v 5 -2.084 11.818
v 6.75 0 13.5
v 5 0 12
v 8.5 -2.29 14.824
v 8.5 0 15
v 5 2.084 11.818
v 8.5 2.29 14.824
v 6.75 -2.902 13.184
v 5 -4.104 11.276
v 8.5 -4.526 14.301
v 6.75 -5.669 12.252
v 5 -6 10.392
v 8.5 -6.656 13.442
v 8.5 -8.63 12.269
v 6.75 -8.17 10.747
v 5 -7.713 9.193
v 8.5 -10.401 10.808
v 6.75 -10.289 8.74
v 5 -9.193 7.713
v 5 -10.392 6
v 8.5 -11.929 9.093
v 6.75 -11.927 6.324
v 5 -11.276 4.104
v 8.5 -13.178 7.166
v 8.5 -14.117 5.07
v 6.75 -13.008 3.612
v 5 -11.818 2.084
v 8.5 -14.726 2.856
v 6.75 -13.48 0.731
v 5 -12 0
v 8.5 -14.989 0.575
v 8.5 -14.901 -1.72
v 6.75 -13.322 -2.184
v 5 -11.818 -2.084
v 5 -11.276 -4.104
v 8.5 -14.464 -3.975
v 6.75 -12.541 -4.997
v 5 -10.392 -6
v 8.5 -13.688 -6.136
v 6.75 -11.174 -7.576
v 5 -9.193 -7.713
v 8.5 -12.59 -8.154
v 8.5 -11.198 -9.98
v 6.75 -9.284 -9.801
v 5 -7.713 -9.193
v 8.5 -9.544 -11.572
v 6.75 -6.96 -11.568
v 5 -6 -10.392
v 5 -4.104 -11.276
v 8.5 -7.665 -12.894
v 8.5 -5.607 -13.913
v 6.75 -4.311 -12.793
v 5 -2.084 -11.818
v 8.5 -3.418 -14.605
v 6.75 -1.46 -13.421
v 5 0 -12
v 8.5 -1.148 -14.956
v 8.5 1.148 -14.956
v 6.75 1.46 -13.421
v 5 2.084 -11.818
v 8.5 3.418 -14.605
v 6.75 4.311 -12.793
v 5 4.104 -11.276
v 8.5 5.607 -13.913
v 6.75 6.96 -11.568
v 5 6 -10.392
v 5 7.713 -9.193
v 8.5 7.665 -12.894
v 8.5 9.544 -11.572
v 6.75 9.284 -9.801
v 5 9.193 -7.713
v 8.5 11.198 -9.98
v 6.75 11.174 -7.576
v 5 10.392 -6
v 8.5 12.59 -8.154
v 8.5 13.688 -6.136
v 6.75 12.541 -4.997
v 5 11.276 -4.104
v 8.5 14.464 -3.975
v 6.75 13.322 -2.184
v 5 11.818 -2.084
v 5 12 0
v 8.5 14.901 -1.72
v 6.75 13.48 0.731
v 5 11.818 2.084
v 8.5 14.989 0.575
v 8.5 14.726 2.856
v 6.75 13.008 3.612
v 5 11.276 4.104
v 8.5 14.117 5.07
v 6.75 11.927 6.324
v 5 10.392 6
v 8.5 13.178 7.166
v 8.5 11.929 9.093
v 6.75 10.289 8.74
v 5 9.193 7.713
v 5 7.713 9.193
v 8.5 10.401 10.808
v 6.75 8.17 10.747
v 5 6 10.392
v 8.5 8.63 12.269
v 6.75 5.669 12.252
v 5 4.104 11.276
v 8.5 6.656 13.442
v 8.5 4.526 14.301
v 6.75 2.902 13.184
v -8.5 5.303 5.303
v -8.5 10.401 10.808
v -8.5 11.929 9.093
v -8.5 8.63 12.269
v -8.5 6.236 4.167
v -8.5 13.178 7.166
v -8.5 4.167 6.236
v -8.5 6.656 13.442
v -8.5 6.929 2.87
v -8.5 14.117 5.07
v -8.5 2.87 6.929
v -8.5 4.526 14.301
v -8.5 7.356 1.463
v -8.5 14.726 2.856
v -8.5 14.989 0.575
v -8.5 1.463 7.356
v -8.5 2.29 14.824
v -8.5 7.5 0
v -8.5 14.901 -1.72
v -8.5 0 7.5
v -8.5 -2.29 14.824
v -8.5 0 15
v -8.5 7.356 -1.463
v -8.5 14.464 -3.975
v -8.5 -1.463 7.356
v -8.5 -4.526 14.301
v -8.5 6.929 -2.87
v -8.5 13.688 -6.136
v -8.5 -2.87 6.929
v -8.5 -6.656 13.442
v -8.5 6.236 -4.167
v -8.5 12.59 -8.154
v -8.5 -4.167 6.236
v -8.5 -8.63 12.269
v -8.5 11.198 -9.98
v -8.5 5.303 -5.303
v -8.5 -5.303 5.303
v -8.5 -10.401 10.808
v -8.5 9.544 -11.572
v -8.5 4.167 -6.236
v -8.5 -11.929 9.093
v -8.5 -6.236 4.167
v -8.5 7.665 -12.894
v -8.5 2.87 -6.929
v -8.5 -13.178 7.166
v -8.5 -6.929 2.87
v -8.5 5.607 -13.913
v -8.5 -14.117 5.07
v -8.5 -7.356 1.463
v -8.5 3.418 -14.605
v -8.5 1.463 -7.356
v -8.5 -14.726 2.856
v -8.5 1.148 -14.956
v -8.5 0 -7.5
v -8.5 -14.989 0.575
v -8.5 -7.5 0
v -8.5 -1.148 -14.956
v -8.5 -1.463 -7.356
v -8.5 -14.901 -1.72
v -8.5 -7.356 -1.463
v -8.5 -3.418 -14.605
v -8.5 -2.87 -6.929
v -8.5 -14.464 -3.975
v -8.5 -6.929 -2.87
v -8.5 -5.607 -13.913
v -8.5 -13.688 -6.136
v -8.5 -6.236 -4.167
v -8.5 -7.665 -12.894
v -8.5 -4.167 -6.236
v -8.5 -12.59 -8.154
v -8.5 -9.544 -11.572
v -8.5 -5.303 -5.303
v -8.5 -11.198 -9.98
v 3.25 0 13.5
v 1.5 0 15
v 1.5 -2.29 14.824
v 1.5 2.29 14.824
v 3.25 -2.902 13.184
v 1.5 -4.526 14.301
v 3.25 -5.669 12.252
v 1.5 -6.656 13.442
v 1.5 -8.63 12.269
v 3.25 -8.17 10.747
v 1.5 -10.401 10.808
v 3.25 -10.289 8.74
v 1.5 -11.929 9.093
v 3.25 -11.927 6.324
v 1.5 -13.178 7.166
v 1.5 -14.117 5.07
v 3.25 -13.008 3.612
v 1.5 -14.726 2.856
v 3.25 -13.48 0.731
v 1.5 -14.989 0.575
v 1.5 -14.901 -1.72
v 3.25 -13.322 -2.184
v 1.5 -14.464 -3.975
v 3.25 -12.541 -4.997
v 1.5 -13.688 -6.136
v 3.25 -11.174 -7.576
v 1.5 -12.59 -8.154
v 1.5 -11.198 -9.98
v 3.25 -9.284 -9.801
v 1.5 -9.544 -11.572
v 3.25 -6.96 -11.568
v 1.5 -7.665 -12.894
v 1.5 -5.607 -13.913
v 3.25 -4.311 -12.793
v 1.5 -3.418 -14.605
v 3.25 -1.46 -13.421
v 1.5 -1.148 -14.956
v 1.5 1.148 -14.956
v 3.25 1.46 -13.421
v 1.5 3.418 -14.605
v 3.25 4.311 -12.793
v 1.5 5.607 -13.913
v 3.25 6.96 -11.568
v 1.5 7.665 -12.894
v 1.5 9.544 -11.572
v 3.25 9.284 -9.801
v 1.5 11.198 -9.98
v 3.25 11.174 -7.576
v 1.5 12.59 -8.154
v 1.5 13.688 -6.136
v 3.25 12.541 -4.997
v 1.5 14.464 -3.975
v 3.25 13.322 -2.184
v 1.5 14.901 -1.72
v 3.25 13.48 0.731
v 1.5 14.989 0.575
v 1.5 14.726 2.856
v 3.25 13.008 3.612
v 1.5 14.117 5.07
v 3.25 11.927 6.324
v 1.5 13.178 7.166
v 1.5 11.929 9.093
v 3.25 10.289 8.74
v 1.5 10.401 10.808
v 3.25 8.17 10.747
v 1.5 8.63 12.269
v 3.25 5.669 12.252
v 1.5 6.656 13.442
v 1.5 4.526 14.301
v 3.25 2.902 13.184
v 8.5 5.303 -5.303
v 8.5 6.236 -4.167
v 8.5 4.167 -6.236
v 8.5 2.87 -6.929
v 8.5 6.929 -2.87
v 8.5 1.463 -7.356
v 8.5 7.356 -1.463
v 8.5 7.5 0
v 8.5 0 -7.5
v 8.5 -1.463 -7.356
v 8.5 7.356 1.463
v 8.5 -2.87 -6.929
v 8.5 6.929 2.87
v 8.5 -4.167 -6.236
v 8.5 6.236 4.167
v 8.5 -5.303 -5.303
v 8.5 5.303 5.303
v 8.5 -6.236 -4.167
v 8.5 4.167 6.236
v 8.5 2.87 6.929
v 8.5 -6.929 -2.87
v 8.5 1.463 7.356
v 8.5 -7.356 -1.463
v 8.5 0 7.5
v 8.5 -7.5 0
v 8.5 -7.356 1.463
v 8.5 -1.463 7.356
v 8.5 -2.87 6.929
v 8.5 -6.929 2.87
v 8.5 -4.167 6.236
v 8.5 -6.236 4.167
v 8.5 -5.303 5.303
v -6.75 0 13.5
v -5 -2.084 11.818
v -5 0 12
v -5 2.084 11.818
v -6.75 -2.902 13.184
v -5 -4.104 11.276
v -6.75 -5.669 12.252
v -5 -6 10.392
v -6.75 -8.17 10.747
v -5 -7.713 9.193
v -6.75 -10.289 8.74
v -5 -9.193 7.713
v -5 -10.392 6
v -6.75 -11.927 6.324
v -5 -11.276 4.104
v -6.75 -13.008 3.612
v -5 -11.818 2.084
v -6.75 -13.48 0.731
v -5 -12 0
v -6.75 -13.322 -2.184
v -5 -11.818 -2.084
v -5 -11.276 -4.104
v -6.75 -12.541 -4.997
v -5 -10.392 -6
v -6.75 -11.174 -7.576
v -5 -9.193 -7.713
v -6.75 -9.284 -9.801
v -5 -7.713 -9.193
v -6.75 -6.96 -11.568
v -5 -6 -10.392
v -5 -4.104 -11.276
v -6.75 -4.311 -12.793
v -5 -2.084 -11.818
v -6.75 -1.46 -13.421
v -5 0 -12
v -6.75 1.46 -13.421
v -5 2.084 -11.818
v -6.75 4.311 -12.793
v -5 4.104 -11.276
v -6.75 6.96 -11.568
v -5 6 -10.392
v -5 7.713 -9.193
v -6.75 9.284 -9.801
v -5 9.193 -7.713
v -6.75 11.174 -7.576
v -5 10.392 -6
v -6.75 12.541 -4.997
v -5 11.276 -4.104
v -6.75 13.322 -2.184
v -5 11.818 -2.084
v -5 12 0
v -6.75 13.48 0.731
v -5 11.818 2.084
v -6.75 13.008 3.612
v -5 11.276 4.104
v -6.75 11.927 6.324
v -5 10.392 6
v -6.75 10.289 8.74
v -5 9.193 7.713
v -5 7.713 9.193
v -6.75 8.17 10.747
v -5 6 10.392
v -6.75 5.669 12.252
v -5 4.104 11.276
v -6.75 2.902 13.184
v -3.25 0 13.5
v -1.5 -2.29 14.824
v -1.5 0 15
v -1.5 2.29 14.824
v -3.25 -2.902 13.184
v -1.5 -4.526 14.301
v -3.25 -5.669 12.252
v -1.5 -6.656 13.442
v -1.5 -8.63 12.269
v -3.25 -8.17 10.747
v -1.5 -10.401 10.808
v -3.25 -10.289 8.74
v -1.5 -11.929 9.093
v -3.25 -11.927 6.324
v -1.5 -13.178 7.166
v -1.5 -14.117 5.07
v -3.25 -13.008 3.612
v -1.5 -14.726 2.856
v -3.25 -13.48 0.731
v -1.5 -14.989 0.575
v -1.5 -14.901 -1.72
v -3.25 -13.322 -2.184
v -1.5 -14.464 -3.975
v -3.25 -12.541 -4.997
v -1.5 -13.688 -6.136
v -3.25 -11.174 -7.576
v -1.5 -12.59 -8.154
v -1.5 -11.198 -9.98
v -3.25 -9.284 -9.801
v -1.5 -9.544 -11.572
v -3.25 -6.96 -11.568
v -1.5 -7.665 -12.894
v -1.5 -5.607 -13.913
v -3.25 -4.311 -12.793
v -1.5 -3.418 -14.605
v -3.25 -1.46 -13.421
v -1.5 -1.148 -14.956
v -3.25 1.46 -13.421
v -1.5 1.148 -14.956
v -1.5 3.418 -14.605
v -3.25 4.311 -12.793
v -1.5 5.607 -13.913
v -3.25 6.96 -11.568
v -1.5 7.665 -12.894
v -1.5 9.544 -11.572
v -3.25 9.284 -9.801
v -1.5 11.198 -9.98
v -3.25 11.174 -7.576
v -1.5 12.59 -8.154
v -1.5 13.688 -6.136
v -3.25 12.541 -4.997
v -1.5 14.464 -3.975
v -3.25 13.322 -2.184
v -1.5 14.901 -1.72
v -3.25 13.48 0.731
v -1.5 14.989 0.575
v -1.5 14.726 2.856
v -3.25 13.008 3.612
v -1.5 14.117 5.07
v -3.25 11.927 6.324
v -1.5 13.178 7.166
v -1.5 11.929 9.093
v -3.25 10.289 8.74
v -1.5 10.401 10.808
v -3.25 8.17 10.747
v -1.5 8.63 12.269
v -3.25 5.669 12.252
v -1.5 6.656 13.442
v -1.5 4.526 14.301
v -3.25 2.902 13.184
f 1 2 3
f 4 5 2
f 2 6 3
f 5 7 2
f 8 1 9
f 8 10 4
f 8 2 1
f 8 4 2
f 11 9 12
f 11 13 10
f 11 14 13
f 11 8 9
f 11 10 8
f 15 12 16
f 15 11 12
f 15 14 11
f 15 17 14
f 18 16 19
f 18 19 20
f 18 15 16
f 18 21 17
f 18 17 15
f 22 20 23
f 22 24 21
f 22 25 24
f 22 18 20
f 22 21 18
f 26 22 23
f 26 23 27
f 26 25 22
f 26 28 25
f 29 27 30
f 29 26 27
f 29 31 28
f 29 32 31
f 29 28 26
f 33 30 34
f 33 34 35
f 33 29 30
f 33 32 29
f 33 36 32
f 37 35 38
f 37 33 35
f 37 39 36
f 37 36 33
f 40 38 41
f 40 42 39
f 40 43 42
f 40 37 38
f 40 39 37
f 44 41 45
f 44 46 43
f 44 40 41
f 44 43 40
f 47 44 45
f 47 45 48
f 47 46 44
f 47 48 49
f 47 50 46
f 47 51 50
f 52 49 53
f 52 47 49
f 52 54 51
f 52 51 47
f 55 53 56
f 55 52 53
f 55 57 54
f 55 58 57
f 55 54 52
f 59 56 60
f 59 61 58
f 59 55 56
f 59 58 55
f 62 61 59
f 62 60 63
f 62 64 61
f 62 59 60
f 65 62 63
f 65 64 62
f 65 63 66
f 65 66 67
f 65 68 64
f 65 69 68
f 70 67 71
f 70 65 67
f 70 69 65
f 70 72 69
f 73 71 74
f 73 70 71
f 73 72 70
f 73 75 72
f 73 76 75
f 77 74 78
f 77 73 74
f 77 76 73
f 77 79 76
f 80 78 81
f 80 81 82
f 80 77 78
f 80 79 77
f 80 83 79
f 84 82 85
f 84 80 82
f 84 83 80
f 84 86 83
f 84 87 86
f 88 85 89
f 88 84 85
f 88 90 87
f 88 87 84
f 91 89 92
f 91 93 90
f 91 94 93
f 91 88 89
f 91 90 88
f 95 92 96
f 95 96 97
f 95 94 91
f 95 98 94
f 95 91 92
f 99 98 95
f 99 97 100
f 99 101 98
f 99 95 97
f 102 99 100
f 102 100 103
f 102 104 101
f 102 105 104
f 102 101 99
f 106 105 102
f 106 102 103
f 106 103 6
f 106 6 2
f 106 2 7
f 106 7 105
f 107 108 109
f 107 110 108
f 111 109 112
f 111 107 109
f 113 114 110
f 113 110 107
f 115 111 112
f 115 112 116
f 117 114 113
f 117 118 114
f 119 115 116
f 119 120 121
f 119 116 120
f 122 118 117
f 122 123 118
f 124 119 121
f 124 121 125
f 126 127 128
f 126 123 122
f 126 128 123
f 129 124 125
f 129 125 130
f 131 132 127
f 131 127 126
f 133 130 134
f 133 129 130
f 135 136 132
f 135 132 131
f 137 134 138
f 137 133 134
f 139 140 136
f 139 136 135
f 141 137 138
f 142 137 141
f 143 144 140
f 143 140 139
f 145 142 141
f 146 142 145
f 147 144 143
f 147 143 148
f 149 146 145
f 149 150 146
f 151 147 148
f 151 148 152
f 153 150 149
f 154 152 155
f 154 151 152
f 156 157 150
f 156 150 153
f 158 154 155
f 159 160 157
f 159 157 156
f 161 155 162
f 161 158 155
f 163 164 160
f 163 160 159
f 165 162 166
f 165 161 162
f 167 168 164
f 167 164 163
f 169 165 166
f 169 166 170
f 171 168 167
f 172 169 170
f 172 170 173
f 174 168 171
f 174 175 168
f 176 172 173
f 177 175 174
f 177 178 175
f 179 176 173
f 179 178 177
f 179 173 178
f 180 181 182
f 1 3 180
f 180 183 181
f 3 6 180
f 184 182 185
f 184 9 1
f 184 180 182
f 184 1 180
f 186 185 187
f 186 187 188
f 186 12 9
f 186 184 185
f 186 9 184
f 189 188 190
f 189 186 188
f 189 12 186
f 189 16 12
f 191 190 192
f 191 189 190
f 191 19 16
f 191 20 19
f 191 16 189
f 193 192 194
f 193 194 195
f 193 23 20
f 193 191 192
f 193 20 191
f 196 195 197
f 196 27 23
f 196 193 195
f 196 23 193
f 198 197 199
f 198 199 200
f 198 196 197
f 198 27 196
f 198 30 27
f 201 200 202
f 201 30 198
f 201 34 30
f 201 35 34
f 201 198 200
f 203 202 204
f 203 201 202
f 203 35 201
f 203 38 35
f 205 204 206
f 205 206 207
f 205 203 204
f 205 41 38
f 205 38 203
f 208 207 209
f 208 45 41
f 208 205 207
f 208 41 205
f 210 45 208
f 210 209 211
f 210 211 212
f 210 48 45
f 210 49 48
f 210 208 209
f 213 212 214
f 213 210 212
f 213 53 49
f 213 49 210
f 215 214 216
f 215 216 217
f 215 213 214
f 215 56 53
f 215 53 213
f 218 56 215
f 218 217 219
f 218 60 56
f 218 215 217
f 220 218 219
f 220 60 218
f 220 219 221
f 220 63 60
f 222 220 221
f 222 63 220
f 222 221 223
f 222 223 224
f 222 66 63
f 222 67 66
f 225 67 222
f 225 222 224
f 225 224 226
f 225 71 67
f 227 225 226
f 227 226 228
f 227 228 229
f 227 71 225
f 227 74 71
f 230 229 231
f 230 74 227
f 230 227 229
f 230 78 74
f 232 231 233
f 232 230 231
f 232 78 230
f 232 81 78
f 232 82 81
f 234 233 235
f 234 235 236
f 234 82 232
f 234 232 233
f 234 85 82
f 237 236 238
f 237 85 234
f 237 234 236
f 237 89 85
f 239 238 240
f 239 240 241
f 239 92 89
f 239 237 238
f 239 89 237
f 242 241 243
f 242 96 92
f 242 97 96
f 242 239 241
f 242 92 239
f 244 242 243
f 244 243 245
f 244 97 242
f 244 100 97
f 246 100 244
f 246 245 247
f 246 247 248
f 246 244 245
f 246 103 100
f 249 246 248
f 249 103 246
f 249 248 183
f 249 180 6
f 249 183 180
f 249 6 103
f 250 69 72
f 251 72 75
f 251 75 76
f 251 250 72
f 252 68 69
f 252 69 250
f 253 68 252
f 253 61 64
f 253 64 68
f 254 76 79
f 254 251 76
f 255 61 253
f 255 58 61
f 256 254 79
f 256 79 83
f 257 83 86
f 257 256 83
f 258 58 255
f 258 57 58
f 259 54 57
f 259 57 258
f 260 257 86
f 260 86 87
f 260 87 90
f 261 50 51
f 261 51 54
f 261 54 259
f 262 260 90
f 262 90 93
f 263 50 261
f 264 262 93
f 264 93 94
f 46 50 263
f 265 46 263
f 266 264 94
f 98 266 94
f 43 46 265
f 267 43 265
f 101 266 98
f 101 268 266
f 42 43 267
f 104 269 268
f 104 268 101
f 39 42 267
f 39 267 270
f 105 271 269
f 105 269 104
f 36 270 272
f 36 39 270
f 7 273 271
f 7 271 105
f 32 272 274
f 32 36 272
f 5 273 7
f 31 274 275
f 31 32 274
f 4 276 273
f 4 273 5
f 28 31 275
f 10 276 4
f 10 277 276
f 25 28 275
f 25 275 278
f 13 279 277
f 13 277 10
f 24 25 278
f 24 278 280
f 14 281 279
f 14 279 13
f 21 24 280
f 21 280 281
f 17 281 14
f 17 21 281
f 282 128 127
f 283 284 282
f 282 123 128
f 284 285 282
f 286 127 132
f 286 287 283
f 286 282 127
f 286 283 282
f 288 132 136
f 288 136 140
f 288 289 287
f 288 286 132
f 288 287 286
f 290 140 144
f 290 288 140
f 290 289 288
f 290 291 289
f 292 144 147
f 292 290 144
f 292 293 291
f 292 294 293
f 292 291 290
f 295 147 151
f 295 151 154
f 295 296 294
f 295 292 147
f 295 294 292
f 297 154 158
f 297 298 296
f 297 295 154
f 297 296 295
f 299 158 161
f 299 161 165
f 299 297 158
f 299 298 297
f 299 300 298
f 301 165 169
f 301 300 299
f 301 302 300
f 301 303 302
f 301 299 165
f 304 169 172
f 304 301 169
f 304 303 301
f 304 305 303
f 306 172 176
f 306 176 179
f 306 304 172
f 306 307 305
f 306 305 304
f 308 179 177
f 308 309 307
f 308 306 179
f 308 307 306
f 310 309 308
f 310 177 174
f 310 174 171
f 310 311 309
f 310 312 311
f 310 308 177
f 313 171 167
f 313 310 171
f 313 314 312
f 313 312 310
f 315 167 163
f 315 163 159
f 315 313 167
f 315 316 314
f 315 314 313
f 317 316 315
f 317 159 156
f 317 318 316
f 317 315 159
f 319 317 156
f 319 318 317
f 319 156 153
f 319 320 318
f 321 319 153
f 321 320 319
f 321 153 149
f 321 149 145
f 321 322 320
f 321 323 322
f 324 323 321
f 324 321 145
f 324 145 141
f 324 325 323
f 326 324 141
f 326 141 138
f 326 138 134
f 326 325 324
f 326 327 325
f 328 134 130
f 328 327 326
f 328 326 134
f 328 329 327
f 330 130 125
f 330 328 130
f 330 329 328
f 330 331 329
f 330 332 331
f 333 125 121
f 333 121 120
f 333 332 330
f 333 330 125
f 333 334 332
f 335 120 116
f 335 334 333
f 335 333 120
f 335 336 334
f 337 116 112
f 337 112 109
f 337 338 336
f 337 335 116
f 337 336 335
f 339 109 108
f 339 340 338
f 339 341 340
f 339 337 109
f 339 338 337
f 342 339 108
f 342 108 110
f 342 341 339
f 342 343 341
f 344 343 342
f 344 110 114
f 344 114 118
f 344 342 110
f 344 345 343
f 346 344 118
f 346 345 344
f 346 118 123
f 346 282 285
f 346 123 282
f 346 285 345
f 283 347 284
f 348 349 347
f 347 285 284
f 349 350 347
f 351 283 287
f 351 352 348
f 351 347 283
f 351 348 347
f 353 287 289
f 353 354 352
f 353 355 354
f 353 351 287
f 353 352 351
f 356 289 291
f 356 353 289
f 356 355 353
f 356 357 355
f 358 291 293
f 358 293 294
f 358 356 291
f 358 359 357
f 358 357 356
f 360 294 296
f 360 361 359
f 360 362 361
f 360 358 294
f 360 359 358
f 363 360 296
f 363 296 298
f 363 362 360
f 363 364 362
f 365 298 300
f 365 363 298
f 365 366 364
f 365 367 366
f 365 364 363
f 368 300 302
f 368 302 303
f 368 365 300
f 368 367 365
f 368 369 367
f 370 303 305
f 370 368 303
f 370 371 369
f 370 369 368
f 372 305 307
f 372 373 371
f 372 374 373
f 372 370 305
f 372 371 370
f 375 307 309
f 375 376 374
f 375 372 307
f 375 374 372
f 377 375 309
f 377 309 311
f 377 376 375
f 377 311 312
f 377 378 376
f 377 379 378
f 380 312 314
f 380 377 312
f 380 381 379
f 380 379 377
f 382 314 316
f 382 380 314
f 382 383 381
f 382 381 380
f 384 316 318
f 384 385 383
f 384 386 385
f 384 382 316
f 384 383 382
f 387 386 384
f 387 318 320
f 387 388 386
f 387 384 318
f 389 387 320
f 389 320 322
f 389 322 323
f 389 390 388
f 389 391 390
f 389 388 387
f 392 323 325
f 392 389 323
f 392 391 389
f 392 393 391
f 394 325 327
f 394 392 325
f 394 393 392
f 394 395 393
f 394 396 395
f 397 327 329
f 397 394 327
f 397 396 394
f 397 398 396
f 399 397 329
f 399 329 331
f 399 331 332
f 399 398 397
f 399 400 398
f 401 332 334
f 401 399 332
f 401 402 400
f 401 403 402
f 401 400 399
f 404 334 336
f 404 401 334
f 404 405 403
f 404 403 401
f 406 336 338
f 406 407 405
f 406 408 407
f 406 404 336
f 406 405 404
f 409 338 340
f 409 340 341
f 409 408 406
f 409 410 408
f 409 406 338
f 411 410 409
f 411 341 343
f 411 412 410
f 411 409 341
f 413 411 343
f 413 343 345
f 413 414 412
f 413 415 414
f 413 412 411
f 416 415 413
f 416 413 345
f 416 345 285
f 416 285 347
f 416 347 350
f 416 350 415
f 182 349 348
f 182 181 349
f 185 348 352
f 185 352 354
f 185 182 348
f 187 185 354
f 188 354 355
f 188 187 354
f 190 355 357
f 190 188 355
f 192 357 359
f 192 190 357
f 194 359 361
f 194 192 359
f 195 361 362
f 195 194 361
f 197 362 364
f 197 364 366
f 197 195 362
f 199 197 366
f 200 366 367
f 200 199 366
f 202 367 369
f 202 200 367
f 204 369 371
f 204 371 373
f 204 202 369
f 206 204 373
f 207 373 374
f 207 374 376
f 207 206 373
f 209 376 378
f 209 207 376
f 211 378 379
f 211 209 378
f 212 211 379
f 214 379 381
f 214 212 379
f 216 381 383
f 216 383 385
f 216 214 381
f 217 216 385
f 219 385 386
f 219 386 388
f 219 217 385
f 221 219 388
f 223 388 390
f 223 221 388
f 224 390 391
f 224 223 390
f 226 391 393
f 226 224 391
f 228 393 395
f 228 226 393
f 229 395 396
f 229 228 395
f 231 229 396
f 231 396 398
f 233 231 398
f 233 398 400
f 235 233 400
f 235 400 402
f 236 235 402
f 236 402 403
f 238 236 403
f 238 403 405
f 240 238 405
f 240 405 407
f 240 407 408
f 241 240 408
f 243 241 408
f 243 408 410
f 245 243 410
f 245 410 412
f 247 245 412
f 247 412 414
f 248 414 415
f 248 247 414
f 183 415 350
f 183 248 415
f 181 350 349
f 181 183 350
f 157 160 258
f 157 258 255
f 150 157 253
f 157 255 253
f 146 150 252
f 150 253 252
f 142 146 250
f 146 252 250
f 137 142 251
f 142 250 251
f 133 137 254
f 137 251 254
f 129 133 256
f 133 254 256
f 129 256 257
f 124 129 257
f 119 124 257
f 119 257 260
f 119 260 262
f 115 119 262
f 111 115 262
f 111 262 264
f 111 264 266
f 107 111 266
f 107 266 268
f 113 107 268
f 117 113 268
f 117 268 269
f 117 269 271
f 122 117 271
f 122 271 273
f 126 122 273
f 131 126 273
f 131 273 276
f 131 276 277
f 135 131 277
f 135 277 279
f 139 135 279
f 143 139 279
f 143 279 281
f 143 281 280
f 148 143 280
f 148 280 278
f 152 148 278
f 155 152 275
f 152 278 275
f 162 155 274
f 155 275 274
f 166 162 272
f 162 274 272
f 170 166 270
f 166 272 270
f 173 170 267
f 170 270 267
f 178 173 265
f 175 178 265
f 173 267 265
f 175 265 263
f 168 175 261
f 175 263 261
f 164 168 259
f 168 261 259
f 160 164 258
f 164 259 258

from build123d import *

# Parameters (mm, degrees)
F_15_0_15_DURCHMESSER_BOHRUNG2_D = 15


with BuildPart() as part:
    # Skizze1 → Rotation1 (revolve)
    with BuildSketch(Plane.XY, mode=Mode.PRIVATE) as rotation1_sk:
        Polygon((-8.5, 0), (-8.5, 15), (-5, 12), (-1.5, 15), (1.5, 15), (5, 12), (8.5, 15), (8.5, 0), align=None)
    revolve(rotation1_sk.sketch.rotate(Axis((-85.191280049, 0, 0), (1, 0, 0)), 90), axis=Axis((-85.191280049, 0, 0), (1, 0, 0)))

    # Ø15.0 (15) Durchmesser Bohrung2 (through all)
    with Locations(Plane.ZY.offset(8.5)):
        with Locations((0, 0)):
            Hole(F_15_0_15_DURCHMESSER_BOHRUNG2_D / 2)


solid = part.part
